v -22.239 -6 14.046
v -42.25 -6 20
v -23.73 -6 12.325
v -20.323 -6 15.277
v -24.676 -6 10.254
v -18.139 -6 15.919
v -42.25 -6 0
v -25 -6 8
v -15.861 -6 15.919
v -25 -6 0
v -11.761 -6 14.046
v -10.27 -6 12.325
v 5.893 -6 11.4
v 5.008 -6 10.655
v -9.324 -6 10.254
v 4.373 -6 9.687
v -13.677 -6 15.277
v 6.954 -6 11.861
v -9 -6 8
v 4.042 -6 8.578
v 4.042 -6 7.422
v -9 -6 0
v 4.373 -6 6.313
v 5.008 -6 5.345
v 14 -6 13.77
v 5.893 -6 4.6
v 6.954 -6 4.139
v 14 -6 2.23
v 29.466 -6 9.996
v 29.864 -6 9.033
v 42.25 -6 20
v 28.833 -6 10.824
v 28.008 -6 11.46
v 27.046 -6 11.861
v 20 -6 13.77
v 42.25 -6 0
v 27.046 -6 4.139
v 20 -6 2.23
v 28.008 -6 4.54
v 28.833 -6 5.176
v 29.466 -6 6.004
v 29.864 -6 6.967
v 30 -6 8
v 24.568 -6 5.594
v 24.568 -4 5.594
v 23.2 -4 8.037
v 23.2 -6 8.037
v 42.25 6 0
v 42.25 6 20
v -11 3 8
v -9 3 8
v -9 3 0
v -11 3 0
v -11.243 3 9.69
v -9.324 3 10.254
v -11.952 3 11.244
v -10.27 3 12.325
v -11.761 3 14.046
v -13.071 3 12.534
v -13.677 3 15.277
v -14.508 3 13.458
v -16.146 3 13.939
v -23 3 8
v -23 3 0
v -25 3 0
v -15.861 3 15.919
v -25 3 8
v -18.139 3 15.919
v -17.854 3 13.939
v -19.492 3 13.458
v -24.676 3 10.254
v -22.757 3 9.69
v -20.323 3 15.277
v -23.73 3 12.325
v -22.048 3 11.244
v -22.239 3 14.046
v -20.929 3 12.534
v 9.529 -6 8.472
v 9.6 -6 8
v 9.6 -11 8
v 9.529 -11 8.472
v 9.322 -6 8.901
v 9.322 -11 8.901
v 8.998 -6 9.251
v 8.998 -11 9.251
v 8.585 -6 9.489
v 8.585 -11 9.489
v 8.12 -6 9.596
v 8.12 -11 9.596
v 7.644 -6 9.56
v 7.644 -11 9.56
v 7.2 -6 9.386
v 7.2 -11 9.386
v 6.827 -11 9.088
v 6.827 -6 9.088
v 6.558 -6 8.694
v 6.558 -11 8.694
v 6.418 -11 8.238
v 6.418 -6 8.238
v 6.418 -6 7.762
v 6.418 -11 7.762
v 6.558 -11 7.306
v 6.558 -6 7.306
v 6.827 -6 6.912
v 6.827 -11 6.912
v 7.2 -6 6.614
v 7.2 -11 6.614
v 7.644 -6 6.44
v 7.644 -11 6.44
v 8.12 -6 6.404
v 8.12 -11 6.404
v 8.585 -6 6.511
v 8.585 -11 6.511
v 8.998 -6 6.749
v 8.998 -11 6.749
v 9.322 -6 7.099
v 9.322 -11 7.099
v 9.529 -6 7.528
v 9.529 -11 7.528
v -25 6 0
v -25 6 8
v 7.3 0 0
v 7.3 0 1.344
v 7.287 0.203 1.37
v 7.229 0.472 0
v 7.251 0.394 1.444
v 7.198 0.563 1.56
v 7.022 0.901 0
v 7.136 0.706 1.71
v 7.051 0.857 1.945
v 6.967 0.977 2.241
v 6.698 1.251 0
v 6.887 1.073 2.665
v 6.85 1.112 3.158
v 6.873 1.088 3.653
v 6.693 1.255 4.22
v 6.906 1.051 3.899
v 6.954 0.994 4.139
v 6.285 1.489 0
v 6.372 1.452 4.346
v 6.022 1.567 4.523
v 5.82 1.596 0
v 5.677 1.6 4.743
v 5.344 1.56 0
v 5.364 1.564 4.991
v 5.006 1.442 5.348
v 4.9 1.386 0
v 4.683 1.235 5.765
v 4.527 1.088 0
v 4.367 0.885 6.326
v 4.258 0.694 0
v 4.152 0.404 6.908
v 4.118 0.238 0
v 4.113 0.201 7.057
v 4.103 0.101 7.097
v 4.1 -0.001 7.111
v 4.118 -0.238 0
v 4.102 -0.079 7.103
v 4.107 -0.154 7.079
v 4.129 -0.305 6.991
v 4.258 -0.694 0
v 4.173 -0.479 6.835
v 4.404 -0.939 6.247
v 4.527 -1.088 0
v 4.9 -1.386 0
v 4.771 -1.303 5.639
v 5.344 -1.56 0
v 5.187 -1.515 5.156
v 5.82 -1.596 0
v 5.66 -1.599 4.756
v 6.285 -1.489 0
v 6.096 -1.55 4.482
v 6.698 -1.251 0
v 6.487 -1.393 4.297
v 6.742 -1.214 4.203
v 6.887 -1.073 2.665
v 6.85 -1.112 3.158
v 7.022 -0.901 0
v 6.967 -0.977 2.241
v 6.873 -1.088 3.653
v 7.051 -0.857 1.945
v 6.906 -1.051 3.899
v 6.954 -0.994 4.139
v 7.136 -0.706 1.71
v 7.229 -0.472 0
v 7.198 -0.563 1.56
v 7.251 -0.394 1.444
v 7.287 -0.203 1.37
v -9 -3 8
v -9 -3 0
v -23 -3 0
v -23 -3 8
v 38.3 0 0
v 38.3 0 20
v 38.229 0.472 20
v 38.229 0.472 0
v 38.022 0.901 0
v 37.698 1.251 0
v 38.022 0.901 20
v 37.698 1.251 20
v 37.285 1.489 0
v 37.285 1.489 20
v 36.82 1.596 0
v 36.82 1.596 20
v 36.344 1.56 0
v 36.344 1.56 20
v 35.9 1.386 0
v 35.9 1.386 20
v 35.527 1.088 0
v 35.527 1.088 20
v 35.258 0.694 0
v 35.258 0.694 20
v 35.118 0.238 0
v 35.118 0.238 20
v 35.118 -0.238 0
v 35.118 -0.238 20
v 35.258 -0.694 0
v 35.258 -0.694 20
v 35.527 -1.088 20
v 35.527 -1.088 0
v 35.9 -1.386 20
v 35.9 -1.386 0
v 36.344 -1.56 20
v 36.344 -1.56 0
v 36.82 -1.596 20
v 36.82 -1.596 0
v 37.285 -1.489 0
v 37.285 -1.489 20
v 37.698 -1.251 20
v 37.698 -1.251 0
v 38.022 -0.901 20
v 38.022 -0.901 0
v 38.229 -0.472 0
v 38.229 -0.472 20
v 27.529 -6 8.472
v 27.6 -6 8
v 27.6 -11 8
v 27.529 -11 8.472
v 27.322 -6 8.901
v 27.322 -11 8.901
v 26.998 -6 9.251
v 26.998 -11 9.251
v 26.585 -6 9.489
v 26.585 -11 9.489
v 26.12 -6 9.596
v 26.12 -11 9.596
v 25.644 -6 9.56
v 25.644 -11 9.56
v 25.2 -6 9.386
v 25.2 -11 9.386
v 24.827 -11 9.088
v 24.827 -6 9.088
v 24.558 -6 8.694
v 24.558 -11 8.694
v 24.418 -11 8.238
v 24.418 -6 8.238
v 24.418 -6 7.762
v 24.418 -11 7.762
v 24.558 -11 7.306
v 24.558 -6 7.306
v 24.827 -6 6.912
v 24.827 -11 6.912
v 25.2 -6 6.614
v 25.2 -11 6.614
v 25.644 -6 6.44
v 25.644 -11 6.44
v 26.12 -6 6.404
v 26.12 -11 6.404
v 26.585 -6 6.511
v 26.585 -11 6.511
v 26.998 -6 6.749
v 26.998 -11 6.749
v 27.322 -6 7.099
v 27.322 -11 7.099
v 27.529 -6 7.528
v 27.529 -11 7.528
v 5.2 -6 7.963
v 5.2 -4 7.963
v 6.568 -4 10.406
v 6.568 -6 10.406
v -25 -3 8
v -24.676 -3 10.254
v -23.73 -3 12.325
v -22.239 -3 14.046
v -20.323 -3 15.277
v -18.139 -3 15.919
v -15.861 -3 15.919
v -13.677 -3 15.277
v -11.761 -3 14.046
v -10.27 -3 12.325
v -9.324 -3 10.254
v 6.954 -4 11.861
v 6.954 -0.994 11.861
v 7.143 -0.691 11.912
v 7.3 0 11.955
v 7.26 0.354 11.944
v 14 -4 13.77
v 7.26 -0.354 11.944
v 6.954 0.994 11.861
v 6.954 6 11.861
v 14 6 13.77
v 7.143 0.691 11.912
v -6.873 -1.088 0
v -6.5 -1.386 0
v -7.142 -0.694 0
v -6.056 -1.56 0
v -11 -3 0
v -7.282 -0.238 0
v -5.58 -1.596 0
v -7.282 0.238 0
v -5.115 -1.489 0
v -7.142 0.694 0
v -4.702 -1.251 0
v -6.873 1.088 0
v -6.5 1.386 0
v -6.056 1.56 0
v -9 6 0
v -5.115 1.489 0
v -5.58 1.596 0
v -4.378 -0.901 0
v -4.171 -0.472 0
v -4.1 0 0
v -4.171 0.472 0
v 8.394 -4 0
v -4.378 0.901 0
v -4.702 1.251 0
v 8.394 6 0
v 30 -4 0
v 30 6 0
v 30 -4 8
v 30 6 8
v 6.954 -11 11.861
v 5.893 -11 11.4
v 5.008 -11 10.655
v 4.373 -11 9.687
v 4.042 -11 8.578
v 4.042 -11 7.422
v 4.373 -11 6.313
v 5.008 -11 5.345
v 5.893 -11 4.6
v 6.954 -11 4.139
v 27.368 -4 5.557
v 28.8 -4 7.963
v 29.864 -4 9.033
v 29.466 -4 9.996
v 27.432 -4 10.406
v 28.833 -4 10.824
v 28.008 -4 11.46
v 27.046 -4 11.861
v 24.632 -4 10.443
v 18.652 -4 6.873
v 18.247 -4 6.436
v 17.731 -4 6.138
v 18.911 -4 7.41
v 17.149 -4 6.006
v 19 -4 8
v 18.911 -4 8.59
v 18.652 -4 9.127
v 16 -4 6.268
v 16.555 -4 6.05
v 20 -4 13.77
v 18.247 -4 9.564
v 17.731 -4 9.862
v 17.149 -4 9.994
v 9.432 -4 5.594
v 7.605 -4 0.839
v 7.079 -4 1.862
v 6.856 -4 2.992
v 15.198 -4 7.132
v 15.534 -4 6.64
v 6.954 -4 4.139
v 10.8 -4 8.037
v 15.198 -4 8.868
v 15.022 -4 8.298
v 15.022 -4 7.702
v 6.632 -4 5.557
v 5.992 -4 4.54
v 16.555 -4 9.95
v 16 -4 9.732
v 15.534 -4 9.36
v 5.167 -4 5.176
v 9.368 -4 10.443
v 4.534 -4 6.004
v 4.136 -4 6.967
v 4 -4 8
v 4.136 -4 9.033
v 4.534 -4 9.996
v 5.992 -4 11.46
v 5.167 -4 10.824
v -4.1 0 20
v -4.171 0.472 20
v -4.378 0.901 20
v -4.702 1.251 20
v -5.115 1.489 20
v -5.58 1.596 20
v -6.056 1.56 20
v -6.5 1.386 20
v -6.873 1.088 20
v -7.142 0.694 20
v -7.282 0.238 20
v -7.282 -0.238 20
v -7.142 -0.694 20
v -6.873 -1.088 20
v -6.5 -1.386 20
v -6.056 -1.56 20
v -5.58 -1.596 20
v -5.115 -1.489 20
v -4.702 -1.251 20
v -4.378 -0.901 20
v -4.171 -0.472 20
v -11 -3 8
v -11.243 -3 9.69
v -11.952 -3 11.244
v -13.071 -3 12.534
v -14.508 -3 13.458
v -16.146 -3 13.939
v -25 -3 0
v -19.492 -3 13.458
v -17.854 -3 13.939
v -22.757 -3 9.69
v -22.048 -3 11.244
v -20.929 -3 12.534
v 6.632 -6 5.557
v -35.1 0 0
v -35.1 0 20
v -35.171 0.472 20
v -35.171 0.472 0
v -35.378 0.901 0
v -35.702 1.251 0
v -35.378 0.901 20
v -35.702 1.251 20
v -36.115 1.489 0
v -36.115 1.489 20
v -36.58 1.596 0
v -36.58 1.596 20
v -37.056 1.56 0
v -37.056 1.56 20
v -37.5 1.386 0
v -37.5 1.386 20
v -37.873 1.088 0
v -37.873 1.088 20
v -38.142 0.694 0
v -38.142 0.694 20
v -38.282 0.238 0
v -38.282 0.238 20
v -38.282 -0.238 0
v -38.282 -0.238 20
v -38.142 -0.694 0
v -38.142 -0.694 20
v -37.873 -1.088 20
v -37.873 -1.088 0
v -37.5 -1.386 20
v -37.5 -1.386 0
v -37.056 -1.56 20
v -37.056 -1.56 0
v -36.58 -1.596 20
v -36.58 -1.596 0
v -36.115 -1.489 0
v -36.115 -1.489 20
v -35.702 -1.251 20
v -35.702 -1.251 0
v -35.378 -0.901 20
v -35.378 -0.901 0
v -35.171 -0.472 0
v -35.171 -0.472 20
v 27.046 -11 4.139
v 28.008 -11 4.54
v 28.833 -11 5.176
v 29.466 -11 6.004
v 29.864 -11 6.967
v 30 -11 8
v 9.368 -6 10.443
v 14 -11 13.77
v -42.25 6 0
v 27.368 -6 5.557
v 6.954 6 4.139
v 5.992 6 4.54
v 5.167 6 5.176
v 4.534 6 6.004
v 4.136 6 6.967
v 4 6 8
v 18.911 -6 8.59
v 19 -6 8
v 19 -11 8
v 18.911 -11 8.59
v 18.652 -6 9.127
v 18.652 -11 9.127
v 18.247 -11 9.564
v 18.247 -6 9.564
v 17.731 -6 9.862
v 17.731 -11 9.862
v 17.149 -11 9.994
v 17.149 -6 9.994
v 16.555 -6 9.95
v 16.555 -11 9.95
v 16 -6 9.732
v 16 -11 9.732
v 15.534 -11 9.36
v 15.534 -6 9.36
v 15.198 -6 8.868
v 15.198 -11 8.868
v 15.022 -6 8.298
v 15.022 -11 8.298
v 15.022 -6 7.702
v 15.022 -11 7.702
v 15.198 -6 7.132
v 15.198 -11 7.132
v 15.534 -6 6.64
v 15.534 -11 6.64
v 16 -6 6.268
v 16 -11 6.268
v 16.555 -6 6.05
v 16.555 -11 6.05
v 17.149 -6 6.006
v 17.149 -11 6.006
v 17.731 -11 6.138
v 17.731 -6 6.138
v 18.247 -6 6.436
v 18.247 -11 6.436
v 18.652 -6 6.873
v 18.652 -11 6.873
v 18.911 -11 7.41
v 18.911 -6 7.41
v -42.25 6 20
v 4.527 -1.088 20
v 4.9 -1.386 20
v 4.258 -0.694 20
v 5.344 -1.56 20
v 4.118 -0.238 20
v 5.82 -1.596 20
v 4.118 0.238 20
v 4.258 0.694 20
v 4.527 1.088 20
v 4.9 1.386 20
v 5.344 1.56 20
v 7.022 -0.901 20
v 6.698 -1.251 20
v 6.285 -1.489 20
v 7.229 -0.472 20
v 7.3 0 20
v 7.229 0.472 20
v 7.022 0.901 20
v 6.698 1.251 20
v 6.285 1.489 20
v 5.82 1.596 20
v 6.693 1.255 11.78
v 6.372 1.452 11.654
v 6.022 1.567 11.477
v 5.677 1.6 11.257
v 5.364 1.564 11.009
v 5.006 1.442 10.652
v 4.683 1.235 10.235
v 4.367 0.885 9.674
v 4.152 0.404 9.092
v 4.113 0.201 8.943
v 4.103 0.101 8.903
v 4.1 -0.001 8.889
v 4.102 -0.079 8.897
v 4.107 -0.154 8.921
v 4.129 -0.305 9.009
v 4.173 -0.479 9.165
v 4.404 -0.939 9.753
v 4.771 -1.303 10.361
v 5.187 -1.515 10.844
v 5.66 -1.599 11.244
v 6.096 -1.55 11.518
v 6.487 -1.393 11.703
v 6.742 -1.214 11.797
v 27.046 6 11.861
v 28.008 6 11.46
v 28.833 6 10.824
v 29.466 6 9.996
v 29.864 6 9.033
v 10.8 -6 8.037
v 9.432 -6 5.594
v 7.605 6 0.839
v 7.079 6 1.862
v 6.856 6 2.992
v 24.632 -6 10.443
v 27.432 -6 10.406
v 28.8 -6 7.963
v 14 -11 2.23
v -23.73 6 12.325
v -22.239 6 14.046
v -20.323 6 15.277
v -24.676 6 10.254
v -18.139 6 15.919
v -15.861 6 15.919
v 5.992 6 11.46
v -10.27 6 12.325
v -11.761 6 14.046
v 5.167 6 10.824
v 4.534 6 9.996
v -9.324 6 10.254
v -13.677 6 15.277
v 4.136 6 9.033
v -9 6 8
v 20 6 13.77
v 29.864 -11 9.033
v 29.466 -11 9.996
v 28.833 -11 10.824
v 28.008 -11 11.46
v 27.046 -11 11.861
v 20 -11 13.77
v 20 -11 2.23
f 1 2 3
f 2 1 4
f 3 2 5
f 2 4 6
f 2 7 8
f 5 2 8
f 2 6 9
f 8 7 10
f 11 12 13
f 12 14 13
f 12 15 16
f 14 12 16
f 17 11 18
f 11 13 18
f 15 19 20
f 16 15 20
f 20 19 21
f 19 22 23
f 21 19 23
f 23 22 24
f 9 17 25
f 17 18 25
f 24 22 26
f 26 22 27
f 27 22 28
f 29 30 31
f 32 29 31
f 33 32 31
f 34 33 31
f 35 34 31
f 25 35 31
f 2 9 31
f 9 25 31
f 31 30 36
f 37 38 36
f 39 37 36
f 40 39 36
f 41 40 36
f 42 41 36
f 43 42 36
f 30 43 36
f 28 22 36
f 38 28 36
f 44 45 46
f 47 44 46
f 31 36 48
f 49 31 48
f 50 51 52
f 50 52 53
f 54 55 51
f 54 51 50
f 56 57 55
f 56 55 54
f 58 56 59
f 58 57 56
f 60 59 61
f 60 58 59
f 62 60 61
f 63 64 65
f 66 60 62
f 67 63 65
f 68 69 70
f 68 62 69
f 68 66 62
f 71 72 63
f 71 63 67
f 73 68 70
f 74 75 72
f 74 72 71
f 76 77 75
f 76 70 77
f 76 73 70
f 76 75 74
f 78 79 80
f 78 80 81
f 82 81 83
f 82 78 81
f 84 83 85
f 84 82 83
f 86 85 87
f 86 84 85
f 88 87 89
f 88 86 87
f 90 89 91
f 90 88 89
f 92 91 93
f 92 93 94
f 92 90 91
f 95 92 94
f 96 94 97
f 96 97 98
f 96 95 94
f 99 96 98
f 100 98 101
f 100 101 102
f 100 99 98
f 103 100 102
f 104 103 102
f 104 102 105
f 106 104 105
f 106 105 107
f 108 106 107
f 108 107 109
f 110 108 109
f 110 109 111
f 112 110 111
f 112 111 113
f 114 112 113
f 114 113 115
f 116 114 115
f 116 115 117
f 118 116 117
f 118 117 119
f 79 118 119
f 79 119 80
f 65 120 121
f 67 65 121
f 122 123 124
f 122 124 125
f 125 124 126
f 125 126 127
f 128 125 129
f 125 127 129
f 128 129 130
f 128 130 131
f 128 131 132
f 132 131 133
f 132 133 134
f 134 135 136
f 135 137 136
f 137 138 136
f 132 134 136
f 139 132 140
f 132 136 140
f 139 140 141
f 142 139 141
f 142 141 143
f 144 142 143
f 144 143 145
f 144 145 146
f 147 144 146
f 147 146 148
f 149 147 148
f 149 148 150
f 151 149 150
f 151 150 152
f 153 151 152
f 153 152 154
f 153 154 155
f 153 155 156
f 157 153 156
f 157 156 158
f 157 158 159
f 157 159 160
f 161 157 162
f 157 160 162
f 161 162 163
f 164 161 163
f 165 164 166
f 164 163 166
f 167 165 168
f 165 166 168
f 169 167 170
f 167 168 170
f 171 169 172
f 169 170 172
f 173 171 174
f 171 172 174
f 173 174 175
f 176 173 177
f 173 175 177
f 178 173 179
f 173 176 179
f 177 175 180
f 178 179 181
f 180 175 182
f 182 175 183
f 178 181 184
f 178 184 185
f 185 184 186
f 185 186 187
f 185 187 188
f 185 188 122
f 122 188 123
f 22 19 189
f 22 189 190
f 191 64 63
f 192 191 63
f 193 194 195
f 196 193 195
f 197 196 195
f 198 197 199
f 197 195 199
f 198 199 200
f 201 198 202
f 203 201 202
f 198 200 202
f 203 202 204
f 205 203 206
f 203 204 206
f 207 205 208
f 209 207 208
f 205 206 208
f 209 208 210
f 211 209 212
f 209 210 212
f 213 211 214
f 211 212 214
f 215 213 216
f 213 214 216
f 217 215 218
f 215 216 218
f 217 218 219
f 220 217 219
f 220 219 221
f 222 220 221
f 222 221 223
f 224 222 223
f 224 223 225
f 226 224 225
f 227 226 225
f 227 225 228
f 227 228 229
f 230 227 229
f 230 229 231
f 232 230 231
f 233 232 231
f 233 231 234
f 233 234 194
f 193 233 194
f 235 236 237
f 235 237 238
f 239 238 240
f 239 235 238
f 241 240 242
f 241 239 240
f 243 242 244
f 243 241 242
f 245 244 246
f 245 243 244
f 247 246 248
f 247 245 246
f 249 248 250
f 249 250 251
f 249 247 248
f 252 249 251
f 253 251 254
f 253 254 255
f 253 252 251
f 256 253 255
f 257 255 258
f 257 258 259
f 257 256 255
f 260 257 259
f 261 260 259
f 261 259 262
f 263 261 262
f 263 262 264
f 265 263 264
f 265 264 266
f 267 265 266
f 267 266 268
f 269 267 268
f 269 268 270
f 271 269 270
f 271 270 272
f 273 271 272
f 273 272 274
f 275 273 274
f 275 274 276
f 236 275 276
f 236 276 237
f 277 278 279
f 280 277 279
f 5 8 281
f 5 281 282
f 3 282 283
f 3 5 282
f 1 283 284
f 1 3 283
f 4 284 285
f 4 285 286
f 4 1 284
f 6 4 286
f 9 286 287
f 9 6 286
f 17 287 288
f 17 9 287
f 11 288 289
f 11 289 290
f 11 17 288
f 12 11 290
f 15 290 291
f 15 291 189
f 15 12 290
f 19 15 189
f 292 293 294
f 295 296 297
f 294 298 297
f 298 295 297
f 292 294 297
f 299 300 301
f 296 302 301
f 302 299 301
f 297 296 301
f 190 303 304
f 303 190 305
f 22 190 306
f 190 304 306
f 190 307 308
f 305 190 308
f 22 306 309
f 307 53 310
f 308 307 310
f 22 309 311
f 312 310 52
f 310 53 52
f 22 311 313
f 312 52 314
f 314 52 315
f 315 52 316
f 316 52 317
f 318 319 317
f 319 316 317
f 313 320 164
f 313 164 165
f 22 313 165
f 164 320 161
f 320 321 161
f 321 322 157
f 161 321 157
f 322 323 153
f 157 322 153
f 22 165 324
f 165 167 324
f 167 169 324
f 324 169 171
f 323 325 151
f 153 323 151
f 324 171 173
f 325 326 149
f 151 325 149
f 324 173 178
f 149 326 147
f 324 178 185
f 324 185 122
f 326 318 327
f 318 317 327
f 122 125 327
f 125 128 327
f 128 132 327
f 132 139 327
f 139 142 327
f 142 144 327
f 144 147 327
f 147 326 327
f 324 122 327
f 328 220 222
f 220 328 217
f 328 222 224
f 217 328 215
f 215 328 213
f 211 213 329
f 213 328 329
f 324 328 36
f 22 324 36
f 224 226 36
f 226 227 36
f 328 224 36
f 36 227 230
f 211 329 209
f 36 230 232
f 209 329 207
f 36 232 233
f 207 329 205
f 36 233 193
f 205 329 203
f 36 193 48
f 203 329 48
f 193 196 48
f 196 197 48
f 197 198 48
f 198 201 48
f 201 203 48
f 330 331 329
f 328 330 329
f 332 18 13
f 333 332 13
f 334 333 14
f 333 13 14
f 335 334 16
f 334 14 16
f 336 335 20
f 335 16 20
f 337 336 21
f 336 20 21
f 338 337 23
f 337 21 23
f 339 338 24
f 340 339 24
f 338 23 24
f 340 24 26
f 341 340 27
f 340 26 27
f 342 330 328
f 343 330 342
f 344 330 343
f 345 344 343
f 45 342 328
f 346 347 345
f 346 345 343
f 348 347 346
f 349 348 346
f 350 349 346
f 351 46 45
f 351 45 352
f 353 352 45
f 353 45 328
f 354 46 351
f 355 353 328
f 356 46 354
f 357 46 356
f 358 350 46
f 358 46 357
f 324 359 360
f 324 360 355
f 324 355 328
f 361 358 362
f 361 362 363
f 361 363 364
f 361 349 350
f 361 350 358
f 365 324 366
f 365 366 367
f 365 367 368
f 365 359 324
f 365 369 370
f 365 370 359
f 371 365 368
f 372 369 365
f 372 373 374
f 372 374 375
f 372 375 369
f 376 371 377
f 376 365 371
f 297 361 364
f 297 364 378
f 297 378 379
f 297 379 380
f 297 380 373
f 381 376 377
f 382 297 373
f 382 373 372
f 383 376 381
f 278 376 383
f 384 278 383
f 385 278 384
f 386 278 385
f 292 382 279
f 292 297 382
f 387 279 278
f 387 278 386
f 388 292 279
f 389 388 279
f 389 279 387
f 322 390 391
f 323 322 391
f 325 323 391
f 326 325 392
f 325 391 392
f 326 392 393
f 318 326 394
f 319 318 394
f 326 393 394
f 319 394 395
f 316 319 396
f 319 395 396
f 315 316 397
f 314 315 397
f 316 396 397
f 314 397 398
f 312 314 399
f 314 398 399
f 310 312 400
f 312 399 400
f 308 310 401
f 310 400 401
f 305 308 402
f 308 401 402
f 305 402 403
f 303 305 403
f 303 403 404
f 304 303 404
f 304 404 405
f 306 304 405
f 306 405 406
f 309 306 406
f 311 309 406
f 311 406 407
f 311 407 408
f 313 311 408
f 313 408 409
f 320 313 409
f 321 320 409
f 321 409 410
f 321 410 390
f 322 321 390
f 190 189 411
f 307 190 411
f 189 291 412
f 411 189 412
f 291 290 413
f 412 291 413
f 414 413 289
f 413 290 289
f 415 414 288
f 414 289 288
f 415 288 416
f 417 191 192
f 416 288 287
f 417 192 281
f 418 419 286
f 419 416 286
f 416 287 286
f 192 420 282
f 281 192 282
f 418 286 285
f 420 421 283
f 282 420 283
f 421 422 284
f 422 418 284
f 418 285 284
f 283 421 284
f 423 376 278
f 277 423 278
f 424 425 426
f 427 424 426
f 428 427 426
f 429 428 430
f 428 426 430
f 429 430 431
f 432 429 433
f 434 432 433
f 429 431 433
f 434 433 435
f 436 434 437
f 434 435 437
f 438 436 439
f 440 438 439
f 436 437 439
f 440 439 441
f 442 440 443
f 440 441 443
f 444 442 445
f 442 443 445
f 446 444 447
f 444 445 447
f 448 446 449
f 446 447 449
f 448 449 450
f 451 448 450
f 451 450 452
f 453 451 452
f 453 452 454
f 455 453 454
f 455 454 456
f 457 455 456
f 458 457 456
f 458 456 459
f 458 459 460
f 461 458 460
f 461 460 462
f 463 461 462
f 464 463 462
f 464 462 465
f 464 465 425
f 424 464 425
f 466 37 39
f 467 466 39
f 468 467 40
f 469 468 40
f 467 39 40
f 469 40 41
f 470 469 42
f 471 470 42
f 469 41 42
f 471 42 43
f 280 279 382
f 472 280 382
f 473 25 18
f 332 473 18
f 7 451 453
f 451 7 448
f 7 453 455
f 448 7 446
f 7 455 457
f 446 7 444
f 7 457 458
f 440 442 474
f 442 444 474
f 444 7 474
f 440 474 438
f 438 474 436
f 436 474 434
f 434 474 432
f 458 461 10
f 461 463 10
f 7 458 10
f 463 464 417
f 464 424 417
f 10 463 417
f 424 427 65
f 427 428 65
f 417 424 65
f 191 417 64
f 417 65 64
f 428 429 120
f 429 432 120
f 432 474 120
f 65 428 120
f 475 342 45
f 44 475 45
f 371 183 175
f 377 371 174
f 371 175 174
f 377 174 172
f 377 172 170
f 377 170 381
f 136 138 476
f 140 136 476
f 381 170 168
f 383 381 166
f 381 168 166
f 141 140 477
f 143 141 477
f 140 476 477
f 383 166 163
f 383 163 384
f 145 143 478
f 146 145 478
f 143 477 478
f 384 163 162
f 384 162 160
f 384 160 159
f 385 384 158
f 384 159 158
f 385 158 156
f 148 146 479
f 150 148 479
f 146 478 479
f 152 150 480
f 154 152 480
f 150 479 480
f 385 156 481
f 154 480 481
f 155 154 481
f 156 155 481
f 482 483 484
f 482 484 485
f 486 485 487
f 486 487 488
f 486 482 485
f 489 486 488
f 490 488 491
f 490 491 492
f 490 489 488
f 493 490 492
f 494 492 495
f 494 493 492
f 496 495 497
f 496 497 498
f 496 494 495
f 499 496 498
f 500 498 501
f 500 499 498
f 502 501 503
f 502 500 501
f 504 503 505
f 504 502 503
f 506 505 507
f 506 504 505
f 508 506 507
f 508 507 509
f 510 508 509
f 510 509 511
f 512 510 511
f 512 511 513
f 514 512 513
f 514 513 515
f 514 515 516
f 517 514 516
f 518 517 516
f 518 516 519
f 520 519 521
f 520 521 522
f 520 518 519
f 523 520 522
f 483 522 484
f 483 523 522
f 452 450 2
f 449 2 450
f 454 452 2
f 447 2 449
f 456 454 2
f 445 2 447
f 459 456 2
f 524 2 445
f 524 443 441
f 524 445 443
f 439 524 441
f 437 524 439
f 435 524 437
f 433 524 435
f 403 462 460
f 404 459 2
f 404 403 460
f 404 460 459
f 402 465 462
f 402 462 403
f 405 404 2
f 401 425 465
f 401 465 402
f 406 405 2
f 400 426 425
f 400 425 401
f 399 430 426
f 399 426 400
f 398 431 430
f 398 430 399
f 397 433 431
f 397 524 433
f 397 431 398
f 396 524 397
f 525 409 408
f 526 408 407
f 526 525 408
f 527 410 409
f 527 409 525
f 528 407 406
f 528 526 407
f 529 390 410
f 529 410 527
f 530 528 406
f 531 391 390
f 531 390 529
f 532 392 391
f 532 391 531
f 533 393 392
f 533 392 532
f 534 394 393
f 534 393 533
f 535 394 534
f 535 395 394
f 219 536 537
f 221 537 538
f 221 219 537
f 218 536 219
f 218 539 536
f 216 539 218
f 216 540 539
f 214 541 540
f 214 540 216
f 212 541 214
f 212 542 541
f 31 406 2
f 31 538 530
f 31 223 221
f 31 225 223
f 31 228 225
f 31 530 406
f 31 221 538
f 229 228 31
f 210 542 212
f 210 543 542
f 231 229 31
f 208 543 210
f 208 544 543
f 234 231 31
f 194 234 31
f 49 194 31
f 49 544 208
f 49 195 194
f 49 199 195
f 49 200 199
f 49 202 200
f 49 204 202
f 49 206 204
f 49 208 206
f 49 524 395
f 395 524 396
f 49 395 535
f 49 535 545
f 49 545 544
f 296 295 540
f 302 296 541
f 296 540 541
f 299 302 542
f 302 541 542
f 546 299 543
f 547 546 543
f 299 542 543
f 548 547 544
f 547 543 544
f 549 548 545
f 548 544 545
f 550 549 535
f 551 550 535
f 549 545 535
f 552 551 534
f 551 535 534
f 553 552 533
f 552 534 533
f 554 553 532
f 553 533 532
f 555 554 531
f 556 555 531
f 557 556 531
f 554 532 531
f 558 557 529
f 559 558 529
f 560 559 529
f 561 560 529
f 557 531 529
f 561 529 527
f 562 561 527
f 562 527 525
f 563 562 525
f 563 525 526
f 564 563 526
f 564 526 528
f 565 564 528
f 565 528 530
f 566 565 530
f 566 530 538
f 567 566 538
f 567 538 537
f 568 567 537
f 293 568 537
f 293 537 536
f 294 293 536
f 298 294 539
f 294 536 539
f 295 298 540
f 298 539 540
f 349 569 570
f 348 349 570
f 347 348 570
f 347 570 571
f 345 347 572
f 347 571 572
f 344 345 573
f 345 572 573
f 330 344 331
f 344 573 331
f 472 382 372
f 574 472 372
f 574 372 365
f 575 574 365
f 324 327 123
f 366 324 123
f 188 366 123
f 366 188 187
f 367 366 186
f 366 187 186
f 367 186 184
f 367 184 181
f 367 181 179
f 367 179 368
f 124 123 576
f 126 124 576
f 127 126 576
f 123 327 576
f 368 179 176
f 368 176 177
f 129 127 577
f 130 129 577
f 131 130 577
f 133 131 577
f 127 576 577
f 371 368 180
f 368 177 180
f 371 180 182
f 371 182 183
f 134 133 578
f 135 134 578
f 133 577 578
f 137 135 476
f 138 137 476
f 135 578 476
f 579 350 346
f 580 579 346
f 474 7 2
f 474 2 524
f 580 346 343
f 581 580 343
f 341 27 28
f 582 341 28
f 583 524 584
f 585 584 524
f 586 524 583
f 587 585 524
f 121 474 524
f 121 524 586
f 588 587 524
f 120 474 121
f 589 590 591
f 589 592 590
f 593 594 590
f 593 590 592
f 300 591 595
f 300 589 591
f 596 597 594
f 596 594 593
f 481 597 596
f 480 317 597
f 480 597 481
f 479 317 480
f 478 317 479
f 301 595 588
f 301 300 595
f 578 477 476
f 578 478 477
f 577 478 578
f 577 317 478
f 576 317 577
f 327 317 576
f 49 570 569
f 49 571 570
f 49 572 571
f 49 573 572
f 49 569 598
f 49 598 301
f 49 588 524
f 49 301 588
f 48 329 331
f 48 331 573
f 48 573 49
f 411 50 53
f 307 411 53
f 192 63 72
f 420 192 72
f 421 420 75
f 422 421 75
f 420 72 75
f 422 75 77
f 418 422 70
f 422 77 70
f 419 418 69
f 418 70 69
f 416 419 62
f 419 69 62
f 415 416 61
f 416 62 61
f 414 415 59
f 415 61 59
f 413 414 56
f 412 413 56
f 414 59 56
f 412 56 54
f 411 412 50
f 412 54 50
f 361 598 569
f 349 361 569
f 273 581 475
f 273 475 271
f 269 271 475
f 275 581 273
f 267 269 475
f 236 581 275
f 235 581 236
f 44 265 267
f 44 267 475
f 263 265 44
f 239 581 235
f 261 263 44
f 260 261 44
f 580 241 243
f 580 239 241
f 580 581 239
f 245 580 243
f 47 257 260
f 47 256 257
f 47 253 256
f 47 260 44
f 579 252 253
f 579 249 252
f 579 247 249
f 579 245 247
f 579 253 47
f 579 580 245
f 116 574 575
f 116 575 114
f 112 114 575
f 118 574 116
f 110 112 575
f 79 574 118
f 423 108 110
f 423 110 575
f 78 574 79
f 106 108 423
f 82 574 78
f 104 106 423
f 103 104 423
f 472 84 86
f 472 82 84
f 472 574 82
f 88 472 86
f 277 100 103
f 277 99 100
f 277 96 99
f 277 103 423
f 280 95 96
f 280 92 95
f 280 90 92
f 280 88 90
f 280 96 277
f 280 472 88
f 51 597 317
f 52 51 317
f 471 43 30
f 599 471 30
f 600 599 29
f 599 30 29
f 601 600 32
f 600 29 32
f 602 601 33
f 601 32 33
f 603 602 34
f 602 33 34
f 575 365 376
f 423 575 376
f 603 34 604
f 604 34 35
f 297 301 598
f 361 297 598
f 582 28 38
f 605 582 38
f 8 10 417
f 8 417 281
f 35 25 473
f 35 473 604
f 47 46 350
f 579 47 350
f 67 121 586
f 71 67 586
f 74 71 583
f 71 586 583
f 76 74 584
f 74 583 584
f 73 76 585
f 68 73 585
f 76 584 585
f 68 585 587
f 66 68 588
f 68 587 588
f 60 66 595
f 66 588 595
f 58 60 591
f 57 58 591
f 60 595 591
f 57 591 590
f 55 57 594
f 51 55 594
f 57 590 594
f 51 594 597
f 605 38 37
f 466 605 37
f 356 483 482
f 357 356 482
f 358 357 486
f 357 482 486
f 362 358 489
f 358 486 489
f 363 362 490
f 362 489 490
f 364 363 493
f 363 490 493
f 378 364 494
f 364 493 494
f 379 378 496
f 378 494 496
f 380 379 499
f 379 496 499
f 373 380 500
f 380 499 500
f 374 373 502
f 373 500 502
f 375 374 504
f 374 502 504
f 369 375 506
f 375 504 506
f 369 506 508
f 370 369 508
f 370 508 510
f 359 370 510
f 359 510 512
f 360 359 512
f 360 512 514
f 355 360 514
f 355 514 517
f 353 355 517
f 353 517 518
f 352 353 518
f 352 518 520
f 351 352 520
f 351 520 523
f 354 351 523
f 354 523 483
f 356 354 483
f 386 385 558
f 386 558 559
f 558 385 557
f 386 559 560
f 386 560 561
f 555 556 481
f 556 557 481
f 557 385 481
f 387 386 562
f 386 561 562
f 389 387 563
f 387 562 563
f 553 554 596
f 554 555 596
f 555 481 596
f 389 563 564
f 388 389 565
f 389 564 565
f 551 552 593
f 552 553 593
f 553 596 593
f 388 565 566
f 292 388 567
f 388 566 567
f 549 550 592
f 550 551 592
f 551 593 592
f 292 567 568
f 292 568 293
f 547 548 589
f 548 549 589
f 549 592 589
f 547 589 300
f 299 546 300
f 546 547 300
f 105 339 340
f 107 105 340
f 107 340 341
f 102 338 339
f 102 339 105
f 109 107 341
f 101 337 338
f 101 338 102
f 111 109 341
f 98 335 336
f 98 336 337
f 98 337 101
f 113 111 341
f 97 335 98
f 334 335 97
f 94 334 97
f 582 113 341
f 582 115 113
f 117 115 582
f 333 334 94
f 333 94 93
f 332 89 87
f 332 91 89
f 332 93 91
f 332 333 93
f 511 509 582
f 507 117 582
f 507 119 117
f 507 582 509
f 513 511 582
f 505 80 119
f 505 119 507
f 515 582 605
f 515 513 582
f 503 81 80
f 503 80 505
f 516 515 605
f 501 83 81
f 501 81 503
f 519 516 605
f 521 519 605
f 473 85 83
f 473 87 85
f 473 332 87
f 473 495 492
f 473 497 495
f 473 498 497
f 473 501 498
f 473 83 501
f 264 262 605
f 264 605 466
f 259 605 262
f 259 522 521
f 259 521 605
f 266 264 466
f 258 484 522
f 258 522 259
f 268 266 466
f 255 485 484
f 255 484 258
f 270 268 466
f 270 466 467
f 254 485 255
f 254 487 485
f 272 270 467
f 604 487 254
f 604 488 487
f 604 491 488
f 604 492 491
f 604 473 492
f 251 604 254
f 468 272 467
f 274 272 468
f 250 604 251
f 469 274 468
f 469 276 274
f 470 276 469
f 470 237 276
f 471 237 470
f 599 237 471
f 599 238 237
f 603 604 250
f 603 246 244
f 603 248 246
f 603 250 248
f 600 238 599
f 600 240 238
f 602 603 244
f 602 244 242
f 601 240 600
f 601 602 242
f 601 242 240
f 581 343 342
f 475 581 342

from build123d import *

# Parameters (mm, degrees)
F0_W      = 84.5
F0_H      = 12
F1_DEPTH  = 20
F3_DEPTH  = 3
F4_DEPTH  = 25
F5_R      = 1.6
F5_W      = 6
F5_H      = 11.54
F5_R_2    = 2
F6_DEPTH  = 5
F7_DEPTH  = 25
F8_R      = 2
F8_R_2    = 1.6
F9_DEPTH  = 10
F10_R     = 1.6
F11_DEPTH = 25
F12_R     = 1.6
F13_DEPTH = 12
F14_DEPTH = 10


# Not quite as in the source:
# - a pattern or mirror of a feature is missing from the dataset's text; its kind, count and spacing are read off the source's solid


with BuildPart() as f1:
    # F0 (on Top) → F1 (new body)
    with BuildSketch(Plane.XY):
        Rectangle(F0_W, F0_H)
    extrude(amount=F1_DEPTH)

    # F2 (on face) → F3 (cut)
    with BuildSketch(Plane(origin=(0, 6, 0), x_dir=(-1, 0, 0), z_dir=(0, 1, 0))):
        with BuildLine():
            ThreePointArc((11, 8), (17, 2), (23, 8))
            ThreePointArc((23, 8), (17, 14), (11, 8))
        make_face()
        with BuildLine():
            Line((23, 2.7084973779), (23, 8))
            ThreePointArc((23, 8), (17, 2), (11, 8))
            Line((11, 8), (11, 2.7084973779))
            ThreePointArc((11, 2.7084973779), (13.7084973779, 0.7084973779), (17, 0))
            ThreePointArc((17, 0), (20.2915026221, 0.7084973779), (23, 2.7084973779))
        make_face()
        with BuildLine():
            Line((23, 0), (23, 2.7084973779))
            ThreePointArc((23, 2.7084973779), (20.2915026221, 0.7084973779), (17, 0))
            Line((17, 0), (23, 0))
        make_face()
        with BuildLine():
            ThreePointArc((25, 8), (24.4833147735, 5.1715728753), (23, 2.7084973779))
            Line((23, 2.7084973779), (23, 0))
            Line((23, 0), (25, 0))
            Line((25, 0), (25, 8))
        make_face()
        with BuildLine():
            ThreePointArc((17, 0), (13.7084973779, 0.7084973779), (11, 2.7084973779))
            Line((11, 2.7084973779), (11, 0))
            Line((11, 0), (17, 0))
        make_face()
        with BuildLine():
            Line((11, 0), (11, 2.7084973779))
            ThreePointArc((11, 2.7084973779), (9.5166852265, 5.1715728753), (9, 8))
            Line((9, 8), (9, 0))
            Line((9, 0), (11, 0))
        make_face()
        with BuildLine():
            ThreePointArc((11, 8), (17, 14), (23, 8))
            Line((23, 8), (23, 2.7084973779))
            ThreePointArc((23, 2.7084973779), (24.4833147735, 5.1715728753), (25, 8))
            ThreePointArc((25, 8), (17, 16), (9, 8))
            ThreePointArc((9, 8), (9.5166852265, 5.1715728753), (11, 2.7084973779))
            Line((11, 2.7084973779), (11, 8))
        make_face()
    f3 = extrude(amount=-F3_DEPTH, mode=Mode.SUBTRACT)

    # F3_copies: F3 across plane
    add(f3.mirror(Plane(origin=(0, 0, 0), x_dir=(0, 0, -1), z_dir=(0, -1, 0))), mode=Mode.SUBTRACT)

    # F2 (on face) → F4 (cut)
    with BuildSketch(Plane(origin=(0, 6, 0), x_dir=(-1, 0, 0), z_dir=(0, 1, 0))):
        with BuildLine():
            Line((23, 2.7084973779), (23, 8))
            ThreePointArc((23, 8), (17, 2), (11, 8))
            Line((11, 8), (11, 2.7084973779))
            ThreePointArc((11, 2.7084973779), (13.7084973779, 0.7084973779), (17, 0))
            ThreePointArc((17, 0), (20.2915026221, 0.7084973779), (23, 2.7084973779))
        make_face()
        with BuildLine():
            Line((23, 0), (23, 2.7084973779))
            ThreePointArc((23, 2.7084973779), (20.2915026221, 0.7084973779), (17, 0))
            Line((17, 0), (23, 0))
        make_face()
        with BuildLine():
            ThreePointArc((17, 0), (13.7084973779, 0.7084973779), (11, 2.7084973779))
            Line((11, 2.7084973779), (11, 0))
            Line((11, 0), (17, 0))
        make_face()
        with BuildLine():
            ThreePointArc((11, 8), (17, 2), (23, 8))
            ThreePointArc((23, 8), (17, 14), (11, 8))
        make_face()
    extrude(amount=-F4_DEPTH, mode=Mode.SUBTRACT)

    # F5 (on face) → F6 (join)
    with BuildSketch(Plane.XZ.offset(6)):
        with BuildLine():
            ThreePointArc((12, 8), (10.430589025, 11.1768281338), (6.9538815041, 11.8607817981))
            ThreePointArc((6.9538815041, 11.8607817981), (4, 8), (6.9538815041, 4.1392182019))
            ThreePointArc((6.9538815041, 4.1392182019), (10.430589025, 4.8231718662), (12, 8))
        make_face()
        with Locations((8, 8)):
            Circle(F5_R, mode=Mode.SUBTRACT)
        with BuildLine():
            Line((14, 2.23), (14, 13.77))
            Line((14, 13.77), (6.9538815041, 11.8607817981))
            ThreePointArc((6.9538815041, 11.8607817981), (10.430589025, 11.1768281338), (12, 8))
            ThreePointArc((12, 8), (10.430589025, 4.8231718662), (6.9538815041, 4.1392182019))
            Line((6.9538815041, 4.1392182019), (14, 2.23))
        make_face()
        with Locations((17, 8)):
            Rectangle(F5_W, F5_H)
        with Locations((17, 8)):
            Circle(F5_R_2, mode=Mode.SUBTRACT)
        with BuildLine():
            Line((27.0461184959, 11.8607817981), (20, 13.77))
            Line((20, 13.77), (20, 2.23))
            Line((20, 2.23), (27.0461184959, 4.1392182019))
            ThreePointArc((27.0461184959, 4.1392182019), (22, 8), (27.0461184959, 11.8607817981))
        make_face()
        with BuildLine():
            ThreePointArc((30, 8), (29.1768281338, 10.430589025), (27.0461184959, 11.8607817981))
            ThreePointArc((27.0461184959, 11.8607817981), (22, 8), (27.0461184959, 4.1392182019))
            ThreePointArc((27.0461184959, 4.1392182019), (29.1768281338, 5.569410975), (30, 8))
        make_face()
        with Locations((26, 8)):
            Circle(F5_R, mode=Mode.SUBTRACT)
    extrude(amount=F6_DEPTH)

    # F5 (on face) → F7 (cut)
    with BuildSketch(Plane.XZ.offset(6)):
        with Locations((8, 8)):
            Circle(F5_R)
        with Locations((17, 8)):
            Circle(F5_R_2)
        with Locations((26, 8)):
            Circle(F5_R)
    extrude(amount=-F7_DEPTH, mode=Mode.SUBTRACT)

    # F8 (on face) → F9 (cut)
    with BuildSketch(Plane(origin=(0, 6, 0), x_dir=(-1, 0, 0), z_dir=(0, 1, 0))):
        with BuildLine():
            Line((-6.9538815041, 11.8607817981), (-14, 13.77))
            Line((-14, 13.77), (-20, 13.77))
            Line((-20, 13.77), (-27.0461184959, 11.8607817981))
            ThreePointArc((-27.0461184959, 11.8607817981), (-23.569410975, 11.1768281338), (-22, 8))
            ThreePointArc((-22, 8), (-23.569410975, 4.8231718662), (-27.0461184959, 4.1392182019))
            Line((-27.0461184959, 4.1392182019), (-20, 2.23))
            Line((-20, 2.23), (-14, 2.23))
            Line((-14, 2.23), (-6.9538815041, 4.1392182019))
            ThreePointArc((-6.9538815041, 4.1392182019), (-12, 8), (-6.9538815041, 11.8607817981))
        make_face()
        with Locations((-17, 8)):
            Circle(F8_R, mode=Mode.SUBTRACT)
        with BuildLine():
            ThreePointArc((-4, 8), (-4.8231718662, 10.430589025), (-6.9538815041, 11.8607817981))
            ThreePointArc((-6.9538815041, 11.8607817981), (-12, 8), (-6.9538815041, 4.1392182019))
            ThreePointArc((-6.9538815041, 4.1392182019), (-4.8231718662, 5.569410975), (-4, 8))
        make_face()
        with Locations((-8, 8)):
            Circle(F8_R_2, mode=Mode.SUBTRACT)
        with BuildLine():
            ThreePointArc((-22, 8), (-23.569410975, 11.1768281338), (-27.0461184959, 11.8607817981))
            ThreePointArc((-27.0461184959, 11.8607817981), (-29.1768281338, 10.430589025), (-30, 8))
            ThreePointArc((-30, 8), (-29.1768281338, 5.569410975), (-27.0461184959, 4.1392182019))
            ThreePointArc((-27.0461184959, 4.1392182019), (-23.569410975, 4.8231718662), (-22, 8))
        make_face()
        with Locations((-26, 8)):
            Circle(F8_R_2, mode=Mode.SUBTRACT)
    extrude(amount=-F9_DEPTH, mode=Mode.SUBTRACT)

    # F10 (on face) → F11 (cut)
    with BuildSketch(Plane.XY.offset(20)):
        with Locations((-36.7, 0)):
            Circle(F10_R)
        with Locations((-5.7, 0)):
            Circle(F10_R)
        with Locations((5.7, 0)):
            Circle(F10_R)
        with Locations((36.7, 0)):
            Circle(F10_R)
    extrude(amount=-F11_DEPTH, mode=Mode.SUBTRACT)

    # F12 (on face) → F13 (cut)
    with BuildSketch(Plane(origin=(0, 6, 0), x_dir=(-1, 0, 0), z_dir=(0, 1, 0))):
        Polygon((-6.5680812925, 10.4061605963), (-9.3678368482, 10.443158275), (-10.7997555557, 8.0369976787), (-9.4319187075, 5.5938394037), (-6.6321631518, 5.556841725), (-5.2002444443, 7.9630023213), align=None)
        with Locations((-8, 8)):
            Circle(F12_R, mode=Mode.SUBTRACT)
        Polygon((-28.7997555557, 7.9630023213), (-27.3678368482, 5.556841725), (-24.5680812925, 5.5938394037), (-23.2002444443, 8.0369976787), (-24.6321631518, 10.443158275), (-27.4319187075, 10.4061605963), align=None)
        with Locations((-26, 8)):
            Circle(F12_R, mode=Mode.SUBTRACT)
    extrude(amount=-F13_DEPTH, mode=Mode.SUBTRACT)

    # F8 (on face) → F14 (cut)
    with BuildSketch(Plane(origin=(0, 6, 0), x_dir=(-1, 0, 0), z_dir=(0, 1, 0))):
        with BuildLine():
            ThreePointArc((-8.3944853395, 0), (-7.0789353021, 1.8624403356), (-6.9538815041, 4.1392182019))
            Line((-6.9538815041, 4.1392182019), (-14, 2.23))
            Line((-14, 2.23), (-20, 2.23))
            Line((-20, 2.23), (-27.0461184959, 4.1392182019))
            ThreePointArc((-27.0461184959, 4.1392182019), (-29.1768281338, 5.569410975), (-30, 8))
            Line((-30, 8), (-30, 0))
            Line((-30, 0), (-8.3944853395, 0))
        make_face()
    extrude(amount=-F14_DEPTH, mode=Mode.SUBTRACT)


solid = f1.part
